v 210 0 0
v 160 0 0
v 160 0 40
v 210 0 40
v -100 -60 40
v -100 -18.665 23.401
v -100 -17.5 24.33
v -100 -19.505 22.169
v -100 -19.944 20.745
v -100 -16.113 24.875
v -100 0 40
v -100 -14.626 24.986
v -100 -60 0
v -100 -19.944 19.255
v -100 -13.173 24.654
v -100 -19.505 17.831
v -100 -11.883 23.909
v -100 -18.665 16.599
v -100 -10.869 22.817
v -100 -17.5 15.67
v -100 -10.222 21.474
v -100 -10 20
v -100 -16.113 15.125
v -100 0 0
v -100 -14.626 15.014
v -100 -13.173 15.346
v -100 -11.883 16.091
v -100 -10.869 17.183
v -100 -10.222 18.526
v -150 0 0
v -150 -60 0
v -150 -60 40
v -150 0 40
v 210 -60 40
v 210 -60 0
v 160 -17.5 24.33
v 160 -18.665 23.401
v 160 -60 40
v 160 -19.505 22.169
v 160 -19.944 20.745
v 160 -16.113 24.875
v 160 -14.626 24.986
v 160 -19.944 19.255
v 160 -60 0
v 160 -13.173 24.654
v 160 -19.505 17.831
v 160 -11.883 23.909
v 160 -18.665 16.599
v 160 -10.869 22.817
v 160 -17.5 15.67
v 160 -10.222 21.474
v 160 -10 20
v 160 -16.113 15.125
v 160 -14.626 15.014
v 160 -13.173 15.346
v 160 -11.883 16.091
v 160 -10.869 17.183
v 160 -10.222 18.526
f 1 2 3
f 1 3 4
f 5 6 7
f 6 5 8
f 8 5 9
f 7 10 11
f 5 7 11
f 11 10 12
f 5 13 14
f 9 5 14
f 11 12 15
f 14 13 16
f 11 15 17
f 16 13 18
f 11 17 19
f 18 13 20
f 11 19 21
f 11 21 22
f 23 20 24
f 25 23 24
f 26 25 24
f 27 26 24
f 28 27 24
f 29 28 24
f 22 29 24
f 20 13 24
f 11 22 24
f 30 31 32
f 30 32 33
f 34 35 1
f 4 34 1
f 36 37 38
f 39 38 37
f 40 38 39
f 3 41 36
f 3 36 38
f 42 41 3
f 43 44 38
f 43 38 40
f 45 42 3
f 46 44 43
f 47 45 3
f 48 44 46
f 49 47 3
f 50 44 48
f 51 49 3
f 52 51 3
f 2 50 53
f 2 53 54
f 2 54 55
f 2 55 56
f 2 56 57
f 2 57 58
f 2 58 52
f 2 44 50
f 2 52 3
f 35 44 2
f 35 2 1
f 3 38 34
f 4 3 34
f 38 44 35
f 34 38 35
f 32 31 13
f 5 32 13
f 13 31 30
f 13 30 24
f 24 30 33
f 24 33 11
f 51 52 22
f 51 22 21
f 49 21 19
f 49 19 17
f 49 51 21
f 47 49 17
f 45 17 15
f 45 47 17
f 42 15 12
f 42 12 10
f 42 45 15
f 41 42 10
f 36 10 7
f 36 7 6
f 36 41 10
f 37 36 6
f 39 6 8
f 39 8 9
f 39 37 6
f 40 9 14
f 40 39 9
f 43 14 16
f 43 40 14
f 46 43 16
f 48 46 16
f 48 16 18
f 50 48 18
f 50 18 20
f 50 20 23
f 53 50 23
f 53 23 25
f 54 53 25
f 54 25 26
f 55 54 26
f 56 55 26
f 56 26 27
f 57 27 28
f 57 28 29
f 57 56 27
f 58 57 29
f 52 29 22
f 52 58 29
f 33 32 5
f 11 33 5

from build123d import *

# Parameters (mm, degrees)
F0_W     = 50
F0_H     = 60
F1_DEPTH = 40
F3_START = -50
F2_R     = 5
F3_DEPTH = 260


with BuildPart() as f1:
    # F0 (on Top) → F1 (new body)
    with BuildSketch(Plane.XY):
        with Locations((-125, -30)):
            Rectangle(F0_W, F0_H)
    extrude(amount=F1_DEPTH)



with BuildPart() as f1b:
    # F0 (on Top) → F1, piece 2 (new body)
    with BuildSketch(Plane.XY):
        with Locations((185, -30)):
            Rectangle(F0_W, F0_H)
    extrude(amount=F1_DEPTH)


with BuildPart() as f1_1:
    add(f1.part)

    add(f1b.part)  # F3 merges F1b
    # F2 (on face) → F3 (join)
    with BuildSketch(Plane.YZ.offset(210).offset(F3_START)):
        with Locations((-15, 20)):
            Circle(F2_R)
    extrude(amount=-F3_DEPTH)


solid = f1_1.part
